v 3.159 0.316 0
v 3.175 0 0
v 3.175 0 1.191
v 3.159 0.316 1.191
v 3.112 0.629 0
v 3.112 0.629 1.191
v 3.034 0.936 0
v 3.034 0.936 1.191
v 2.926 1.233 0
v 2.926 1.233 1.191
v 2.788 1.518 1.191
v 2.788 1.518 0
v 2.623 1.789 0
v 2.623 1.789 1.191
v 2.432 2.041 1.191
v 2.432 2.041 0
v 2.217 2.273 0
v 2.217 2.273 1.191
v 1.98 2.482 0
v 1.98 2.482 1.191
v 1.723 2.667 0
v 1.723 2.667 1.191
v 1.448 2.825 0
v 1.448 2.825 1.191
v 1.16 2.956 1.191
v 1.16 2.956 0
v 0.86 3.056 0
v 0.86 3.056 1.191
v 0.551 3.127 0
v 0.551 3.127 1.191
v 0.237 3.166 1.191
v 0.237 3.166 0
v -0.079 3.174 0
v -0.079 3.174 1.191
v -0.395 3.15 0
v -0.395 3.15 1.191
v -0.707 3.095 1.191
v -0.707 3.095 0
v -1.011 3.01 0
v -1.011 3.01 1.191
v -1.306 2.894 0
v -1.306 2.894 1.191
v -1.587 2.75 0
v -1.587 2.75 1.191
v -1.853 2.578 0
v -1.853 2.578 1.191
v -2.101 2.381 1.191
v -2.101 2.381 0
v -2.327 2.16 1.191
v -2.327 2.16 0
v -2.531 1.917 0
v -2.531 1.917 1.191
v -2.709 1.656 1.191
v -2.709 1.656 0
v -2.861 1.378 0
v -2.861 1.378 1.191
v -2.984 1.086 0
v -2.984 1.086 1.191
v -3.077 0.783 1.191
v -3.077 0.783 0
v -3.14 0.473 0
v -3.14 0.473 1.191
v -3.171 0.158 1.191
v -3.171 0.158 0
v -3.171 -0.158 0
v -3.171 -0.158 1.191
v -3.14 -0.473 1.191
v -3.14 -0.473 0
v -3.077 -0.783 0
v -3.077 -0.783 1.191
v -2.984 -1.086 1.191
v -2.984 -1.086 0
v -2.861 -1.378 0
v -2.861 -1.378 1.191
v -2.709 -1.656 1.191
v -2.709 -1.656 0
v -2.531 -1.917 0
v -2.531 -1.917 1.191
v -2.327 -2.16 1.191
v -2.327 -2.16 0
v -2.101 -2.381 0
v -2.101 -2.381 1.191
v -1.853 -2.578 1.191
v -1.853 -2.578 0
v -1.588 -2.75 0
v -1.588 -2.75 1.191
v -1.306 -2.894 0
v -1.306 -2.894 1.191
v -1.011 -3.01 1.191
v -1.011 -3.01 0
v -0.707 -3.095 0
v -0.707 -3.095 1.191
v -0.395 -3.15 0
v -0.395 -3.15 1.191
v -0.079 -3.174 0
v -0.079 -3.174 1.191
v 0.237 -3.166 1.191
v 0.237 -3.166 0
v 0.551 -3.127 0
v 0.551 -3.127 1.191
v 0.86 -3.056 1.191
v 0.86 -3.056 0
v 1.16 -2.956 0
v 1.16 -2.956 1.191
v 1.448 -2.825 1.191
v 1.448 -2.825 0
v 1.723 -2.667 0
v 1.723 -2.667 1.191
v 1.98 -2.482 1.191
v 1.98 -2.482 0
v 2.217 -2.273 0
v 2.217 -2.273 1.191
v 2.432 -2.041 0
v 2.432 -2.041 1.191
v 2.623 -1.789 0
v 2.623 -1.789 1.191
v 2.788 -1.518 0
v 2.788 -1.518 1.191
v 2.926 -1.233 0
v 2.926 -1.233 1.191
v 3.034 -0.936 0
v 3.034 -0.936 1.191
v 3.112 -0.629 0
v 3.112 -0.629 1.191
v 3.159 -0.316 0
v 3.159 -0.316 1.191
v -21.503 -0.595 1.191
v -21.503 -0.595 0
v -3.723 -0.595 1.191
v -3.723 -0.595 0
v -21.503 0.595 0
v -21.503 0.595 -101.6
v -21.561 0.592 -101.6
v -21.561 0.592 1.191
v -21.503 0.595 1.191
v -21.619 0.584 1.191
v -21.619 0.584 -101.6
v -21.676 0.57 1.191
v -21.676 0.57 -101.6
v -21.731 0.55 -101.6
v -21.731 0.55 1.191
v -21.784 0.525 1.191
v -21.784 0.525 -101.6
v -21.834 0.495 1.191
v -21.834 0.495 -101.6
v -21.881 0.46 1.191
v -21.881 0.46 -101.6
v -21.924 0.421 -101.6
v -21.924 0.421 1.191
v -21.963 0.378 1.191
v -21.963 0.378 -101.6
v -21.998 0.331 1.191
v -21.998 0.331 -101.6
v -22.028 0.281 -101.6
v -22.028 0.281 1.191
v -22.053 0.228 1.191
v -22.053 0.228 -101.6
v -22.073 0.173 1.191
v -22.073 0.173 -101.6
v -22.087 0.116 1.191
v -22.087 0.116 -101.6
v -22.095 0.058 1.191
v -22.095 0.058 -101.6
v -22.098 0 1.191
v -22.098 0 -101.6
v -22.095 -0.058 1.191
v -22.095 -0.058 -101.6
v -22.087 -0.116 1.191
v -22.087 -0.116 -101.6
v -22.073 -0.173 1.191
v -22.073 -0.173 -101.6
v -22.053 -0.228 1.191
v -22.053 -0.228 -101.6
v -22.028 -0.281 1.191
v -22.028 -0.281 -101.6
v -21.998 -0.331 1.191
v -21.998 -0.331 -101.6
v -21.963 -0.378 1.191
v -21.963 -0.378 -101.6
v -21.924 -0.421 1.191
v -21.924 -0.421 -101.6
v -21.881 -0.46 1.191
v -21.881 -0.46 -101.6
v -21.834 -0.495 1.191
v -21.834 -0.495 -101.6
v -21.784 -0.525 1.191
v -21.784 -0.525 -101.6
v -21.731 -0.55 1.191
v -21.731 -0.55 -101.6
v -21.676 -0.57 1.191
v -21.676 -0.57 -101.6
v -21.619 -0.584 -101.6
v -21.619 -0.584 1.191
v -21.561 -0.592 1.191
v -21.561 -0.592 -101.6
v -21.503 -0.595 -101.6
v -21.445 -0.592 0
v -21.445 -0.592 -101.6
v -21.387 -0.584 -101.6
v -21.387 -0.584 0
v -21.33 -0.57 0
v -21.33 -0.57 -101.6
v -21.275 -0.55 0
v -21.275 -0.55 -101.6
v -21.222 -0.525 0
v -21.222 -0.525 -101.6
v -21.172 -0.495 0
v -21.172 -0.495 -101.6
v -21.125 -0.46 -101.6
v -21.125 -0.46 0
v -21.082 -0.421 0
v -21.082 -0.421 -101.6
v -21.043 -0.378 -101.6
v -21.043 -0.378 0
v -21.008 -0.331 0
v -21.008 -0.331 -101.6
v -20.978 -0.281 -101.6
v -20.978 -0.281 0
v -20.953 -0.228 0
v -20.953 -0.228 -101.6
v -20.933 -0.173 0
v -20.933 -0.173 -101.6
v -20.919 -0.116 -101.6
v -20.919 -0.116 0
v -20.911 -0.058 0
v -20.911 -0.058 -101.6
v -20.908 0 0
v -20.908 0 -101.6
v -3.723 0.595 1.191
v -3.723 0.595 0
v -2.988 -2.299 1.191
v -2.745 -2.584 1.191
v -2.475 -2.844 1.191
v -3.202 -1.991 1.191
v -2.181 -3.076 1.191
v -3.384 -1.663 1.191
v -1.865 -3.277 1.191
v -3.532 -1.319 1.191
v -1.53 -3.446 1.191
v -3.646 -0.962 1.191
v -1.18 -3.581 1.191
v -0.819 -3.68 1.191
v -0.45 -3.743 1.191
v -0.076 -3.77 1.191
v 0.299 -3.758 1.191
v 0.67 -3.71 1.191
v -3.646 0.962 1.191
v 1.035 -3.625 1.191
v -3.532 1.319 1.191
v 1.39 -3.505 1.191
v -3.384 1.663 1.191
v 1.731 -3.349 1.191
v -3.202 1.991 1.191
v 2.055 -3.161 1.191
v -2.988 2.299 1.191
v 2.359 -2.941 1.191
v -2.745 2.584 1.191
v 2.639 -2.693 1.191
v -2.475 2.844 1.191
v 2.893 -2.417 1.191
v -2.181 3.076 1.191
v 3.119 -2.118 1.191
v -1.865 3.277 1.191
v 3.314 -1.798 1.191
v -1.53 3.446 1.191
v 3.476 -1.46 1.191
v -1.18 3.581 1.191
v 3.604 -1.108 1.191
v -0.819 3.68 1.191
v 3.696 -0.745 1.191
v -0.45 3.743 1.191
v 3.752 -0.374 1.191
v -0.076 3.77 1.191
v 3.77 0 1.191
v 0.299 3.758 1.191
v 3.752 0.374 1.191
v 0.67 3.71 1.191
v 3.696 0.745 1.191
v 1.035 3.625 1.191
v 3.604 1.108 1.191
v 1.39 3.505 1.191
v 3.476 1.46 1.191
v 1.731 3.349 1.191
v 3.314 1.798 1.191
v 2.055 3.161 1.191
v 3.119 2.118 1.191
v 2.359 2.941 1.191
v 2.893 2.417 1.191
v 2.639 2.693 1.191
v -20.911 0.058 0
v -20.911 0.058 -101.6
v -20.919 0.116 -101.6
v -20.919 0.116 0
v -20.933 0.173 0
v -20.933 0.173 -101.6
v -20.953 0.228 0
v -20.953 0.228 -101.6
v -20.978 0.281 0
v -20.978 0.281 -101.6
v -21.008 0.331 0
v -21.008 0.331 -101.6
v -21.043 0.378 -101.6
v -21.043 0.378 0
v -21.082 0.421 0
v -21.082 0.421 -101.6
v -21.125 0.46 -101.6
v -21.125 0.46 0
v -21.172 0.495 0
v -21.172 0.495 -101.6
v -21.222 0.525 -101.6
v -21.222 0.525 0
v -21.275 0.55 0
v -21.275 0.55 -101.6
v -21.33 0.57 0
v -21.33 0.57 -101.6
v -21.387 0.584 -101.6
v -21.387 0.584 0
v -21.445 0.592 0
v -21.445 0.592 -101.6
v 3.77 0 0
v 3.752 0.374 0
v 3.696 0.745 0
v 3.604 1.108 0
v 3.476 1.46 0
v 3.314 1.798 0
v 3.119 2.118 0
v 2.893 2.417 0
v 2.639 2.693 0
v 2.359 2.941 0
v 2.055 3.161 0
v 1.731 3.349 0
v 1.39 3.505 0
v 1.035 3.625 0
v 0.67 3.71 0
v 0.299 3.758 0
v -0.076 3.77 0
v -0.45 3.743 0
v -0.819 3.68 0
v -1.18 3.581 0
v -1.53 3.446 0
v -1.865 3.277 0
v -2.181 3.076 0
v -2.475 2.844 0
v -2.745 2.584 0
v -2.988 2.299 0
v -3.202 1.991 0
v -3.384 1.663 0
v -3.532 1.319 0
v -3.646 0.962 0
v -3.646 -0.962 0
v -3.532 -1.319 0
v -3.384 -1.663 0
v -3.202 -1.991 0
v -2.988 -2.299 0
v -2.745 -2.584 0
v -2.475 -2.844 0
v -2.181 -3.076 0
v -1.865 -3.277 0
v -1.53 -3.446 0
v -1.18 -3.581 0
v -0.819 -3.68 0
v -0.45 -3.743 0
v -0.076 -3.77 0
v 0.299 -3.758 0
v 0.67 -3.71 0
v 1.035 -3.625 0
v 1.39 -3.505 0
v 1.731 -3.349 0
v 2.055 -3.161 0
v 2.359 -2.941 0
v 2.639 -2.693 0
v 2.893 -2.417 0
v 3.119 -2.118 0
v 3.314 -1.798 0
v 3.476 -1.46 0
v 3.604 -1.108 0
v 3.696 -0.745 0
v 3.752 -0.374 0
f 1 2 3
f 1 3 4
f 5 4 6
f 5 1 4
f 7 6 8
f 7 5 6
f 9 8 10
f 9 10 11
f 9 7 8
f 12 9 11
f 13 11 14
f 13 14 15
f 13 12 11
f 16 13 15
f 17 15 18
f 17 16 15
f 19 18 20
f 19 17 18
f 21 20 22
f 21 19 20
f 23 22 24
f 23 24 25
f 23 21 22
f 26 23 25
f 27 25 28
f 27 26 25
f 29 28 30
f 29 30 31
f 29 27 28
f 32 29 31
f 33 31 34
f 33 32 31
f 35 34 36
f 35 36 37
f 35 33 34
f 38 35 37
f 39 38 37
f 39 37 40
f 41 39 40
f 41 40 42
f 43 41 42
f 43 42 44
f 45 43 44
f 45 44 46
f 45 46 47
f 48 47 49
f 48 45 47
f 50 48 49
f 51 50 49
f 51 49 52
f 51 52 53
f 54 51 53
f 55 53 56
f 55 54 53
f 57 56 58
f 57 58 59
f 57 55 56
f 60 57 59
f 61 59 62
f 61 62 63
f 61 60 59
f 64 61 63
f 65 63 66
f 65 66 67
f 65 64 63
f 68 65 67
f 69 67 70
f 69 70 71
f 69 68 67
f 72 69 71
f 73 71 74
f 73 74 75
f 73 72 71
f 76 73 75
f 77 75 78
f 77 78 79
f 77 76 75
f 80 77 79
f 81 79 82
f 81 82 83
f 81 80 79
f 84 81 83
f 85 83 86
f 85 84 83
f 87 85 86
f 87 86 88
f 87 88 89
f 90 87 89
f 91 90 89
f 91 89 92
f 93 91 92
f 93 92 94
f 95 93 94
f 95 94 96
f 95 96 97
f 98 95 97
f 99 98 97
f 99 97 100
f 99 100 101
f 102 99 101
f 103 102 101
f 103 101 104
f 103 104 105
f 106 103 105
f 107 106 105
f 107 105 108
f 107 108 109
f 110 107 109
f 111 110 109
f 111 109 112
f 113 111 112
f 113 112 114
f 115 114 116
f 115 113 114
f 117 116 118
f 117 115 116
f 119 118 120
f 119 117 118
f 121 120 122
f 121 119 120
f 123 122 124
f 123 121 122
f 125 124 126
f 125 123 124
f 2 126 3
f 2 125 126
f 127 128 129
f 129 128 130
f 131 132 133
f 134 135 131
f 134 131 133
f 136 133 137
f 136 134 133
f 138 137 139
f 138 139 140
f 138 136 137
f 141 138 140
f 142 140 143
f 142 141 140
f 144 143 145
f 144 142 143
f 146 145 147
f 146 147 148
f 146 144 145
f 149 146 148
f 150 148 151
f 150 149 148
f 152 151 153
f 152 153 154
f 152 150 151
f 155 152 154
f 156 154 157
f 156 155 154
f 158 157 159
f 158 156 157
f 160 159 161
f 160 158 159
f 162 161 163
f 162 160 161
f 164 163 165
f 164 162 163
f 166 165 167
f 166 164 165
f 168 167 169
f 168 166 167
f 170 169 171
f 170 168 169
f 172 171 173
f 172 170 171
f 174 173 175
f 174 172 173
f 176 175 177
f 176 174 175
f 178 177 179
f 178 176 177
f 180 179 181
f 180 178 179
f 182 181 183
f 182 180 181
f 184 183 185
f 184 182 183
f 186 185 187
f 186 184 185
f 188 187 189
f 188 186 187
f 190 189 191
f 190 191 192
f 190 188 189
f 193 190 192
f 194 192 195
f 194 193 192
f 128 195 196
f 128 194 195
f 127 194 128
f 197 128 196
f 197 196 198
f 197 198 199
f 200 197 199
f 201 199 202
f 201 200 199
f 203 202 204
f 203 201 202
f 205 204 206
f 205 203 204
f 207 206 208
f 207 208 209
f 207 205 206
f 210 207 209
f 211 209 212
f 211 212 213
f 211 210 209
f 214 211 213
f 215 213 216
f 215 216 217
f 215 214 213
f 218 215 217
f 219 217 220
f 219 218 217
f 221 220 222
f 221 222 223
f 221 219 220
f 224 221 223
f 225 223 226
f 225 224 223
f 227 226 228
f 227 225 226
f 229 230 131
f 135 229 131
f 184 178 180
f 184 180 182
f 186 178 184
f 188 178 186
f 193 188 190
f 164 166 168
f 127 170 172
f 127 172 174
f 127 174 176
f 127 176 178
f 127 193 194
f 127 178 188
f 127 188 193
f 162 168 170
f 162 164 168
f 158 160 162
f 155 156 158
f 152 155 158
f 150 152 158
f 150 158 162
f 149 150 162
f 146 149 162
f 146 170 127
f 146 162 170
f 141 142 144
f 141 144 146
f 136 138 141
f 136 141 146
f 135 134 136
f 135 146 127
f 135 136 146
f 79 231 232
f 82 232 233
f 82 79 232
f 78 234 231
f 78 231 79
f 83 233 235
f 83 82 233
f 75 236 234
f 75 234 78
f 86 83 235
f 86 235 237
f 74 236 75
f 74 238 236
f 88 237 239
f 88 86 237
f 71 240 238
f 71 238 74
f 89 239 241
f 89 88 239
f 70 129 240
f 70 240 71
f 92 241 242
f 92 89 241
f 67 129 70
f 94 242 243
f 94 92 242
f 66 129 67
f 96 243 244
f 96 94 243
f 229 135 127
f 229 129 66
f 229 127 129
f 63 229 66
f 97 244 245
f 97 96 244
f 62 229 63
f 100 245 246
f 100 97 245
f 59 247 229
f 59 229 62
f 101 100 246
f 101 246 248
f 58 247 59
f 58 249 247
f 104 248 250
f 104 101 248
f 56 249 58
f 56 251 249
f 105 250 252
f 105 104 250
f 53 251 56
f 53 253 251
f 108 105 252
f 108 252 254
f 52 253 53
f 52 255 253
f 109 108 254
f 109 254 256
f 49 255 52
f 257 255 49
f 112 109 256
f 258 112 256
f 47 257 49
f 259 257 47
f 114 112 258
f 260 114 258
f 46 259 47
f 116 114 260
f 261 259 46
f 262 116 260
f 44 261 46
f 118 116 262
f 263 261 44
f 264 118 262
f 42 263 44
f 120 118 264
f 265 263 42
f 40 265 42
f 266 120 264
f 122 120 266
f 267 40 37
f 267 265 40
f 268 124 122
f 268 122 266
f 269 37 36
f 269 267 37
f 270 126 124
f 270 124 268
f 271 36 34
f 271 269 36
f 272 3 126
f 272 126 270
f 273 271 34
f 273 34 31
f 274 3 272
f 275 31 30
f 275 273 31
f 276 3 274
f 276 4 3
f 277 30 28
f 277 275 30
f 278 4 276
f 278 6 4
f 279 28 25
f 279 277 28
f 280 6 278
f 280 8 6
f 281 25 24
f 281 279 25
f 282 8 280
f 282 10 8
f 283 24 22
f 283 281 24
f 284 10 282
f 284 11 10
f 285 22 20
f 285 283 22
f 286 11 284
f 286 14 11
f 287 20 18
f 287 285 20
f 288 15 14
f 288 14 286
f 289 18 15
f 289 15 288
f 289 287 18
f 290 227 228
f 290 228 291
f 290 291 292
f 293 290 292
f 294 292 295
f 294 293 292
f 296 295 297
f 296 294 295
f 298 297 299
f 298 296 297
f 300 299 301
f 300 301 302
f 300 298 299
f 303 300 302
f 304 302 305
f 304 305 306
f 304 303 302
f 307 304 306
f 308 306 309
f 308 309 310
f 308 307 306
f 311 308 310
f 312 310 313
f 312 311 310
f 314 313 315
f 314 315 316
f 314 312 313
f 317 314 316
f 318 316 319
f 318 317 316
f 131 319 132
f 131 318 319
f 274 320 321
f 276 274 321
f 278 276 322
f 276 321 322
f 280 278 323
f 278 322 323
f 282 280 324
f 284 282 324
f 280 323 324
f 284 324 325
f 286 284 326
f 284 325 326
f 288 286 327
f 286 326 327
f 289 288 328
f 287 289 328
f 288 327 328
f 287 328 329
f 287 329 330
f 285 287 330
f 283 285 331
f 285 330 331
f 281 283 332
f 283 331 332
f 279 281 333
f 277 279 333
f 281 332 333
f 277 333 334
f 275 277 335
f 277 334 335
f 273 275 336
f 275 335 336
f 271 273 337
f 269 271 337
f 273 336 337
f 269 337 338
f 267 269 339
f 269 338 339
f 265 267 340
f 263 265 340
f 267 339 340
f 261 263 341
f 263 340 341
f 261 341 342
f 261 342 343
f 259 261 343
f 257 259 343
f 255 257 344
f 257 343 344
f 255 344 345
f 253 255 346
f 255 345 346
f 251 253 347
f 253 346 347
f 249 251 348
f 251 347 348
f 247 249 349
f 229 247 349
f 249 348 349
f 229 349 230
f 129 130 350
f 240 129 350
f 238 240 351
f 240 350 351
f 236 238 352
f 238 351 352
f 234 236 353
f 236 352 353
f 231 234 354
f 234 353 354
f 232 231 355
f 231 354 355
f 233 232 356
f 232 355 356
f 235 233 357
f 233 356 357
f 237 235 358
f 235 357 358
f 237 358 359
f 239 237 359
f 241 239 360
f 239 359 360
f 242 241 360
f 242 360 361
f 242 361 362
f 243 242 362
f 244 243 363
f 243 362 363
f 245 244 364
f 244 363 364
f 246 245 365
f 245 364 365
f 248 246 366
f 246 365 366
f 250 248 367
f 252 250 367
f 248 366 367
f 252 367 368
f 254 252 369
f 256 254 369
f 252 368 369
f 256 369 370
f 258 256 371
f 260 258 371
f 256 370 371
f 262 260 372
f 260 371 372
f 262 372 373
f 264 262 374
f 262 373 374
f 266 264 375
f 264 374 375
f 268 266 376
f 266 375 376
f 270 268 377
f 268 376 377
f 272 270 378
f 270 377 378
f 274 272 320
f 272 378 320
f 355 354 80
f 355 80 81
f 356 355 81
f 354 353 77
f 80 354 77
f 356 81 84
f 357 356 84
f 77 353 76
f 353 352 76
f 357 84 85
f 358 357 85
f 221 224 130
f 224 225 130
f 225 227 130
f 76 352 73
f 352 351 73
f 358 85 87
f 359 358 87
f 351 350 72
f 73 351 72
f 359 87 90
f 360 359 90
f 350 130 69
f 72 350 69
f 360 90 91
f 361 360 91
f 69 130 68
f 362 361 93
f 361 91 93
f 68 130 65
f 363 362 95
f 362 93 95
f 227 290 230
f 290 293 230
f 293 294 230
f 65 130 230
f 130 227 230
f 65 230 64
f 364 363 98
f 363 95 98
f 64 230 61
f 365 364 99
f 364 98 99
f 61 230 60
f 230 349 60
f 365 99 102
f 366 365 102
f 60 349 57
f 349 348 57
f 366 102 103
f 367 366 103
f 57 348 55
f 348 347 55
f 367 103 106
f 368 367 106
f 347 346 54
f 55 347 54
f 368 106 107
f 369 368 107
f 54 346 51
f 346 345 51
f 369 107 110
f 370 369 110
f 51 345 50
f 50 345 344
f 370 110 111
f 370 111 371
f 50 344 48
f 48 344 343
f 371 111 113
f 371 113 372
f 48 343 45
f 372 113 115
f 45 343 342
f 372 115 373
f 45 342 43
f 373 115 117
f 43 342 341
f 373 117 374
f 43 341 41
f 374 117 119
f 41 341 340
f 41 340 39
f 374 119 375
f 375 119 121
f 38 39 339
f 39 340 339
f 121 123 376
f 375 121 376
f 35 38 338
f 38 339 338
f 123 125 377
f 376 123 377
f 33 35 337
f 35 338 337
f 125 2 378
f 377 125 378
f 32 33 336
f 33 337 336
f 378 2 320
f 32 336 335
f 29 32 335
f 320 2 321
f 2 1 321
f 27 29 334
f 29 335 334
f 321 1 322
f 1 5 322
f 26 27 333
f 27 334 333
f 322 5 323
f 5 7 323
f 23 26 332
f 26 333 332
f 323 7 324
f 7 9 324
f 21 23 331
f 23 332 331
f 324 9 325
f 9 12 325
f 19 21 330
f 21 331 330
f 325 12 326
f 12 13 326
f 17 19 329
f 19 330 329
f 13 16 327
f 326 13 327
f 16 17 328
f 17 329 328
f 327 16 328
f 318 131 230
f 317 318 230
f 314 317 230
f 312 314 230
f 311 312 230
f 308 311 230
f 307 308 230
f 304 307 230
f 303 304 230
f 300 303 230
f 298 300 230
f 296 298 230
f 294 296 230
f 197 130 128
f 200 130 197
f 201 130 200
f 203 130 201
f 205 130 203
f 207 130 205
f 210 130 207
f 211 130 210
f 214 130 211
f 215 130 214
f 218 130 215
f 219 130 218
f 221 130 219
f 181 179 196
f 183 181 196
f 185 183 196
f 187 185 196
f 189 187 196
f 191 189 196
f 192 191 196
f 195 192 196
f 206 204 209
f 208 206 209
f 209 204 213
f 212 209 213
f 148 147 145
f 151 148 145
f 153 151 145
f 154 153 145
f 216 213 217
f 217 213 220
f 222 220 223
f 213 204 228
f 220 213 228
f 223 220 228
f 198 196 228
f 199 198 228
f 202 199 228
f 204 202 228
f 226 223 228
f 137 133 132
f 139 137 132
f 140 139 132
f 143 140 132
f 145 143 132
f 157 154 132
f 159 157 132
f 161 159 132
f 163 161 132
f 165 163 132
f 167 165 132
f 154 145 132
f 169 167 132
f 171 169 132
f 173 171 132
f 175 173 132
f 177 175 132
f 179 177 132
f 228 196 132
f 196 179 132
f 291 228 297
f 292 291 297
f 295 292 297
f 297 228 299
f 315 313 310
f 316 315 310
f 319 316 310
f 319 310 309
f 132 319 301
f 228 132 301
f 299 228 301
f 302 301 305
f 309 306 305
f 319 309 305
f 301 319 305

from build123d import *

# Parameters (mm, degrees)
F0_R     = 3.175
F1_DEPTH = 1.190625
F2_DEPTH = 101.6


# Not quite as in the source:
# - a length typed as a fraction of an inch, garbled in the dataset ("3 / 203.2 mm" for 3/8 in), is restored


with BuildPart() as f1:
    # F0 (on Top) → F1 (new body)
    with BuildSketch(Plane.XY):
        with BuildLine():
            ThreePointArc((-3.7230175094, -0.5953125), (-3.7703125, 0), (-3.7230175094, 0.5953125))
            Line((-3.7230175094, 0.5953125), (-21.5030175094, 0.5953125))
            ThreePointArc((-21.5030175094, 0.5953125), (-21.0820680037, 0.4209495057), (-20.9077050094, 0))
            ThreePointArc((-20.9077050094, 0), (-21.0820680037, -0.4209495057), (-21.5030175094, -0.5953125))
            Line((-21.5030175094, -0.5953125), (-3.7230175094, -0.5953125))
        make_face()
        with BuildLine():
            ThreePointArc((-3.7230175094, -0.5953125), (0.2985941178, -3.7584701543), (3.7703125, 0))
            ThreePointArc((3.7703125, 0), (0.2985941178, 3.7584701543), (-3.7230175094, 0.5953125))
            ThreePointArc((-3.7230175094, 0.5953125), (-3.7703125, 0), (-3.7230175094, -0.5953125))
        make_face()
        Circle(F0_R, mode=Mode.SUBTRACT)
        with BuildLine():
            ThreePointArc((-20.9077050094, 0), (-21.0820680037, 0.4209495057), (-21.5030175094, 0.5953125))
            ThreePointArc((-21.5030175094, 0.5953125), (-22.0983300094, 0), (-21.5030175094, -0.5953125))
            ThreePointArc((-21.5030175094, -0.5953125), (-21.0820680037, -0.4209495057), (-20.9077050094, 0))
        make_face()
    extrude(amount=F1_DEPTH)

    # F0 (on Top) → F2 (join)
    with BuildSketch(Plane.XY):
        with BuildLine():
            ThreePointArc((-20.9077050094, 0), (-21.0820680037, 0.4209495057), (-21.5030175094, 0.5953125))
            ThreePointArc((-21.5030175094, 0.5953125), (-22.0983300094, 0), (-21.5030175094, -0.5953125))
            ThreePointArc((-21.5030175094, -0.5953125), (-21.0820680037, -0.4209495057), (-20.9077050094, 0))
        make_face()
    extrude(amount=-F2_DEPTH)


solid = f1.part
